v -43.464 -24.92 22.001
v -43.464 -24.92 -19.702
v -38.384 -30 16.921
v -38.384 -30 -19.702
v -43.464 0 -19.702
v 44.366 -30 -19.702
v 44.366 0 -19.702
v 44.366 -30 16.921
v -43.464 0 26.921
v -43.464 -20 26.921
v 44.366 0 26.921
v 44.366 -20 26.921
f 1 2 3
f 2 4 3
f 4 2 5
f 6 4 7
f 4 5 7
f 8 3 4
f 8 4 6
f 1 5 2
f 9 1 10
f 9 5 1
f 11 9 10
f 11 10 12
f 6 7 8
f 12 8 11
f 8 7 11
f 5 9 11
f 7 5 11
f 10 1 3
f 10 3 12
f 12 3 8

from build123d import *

# Parameters (mm, degrees)
F0_W     = 87.830528
F0_H     = 46.622368
F1_DEPTH = 30
F2_SIZE  = 5.08
F3_SIZE  = 10


with BuildPart() as f1:
    # F0 (on Front) → F1 (new body)
    with BuildSketch(Plane.XZ):
        with Locations((0.451185, 3.609474)):
            Rectangle(F0_W, F0_H)
    extrude(amount=F1_DEPTH)

    # F2
    f2_edges = [f1.edges().sort_by_distance(p)[0] for p in [
        (-43.464079, -30, 3.609474),
    ]]
    chamfer(f2_edges, length=F2_SIZE)

    # F3
    f3_edges = [f1.edges().sort_by_distance(p)[0] for p in [
        (2.991185, -30, 26.920658),
    ]]
    chamfer(f3_edges, length=F3_SIZE)


solid = f1.part
